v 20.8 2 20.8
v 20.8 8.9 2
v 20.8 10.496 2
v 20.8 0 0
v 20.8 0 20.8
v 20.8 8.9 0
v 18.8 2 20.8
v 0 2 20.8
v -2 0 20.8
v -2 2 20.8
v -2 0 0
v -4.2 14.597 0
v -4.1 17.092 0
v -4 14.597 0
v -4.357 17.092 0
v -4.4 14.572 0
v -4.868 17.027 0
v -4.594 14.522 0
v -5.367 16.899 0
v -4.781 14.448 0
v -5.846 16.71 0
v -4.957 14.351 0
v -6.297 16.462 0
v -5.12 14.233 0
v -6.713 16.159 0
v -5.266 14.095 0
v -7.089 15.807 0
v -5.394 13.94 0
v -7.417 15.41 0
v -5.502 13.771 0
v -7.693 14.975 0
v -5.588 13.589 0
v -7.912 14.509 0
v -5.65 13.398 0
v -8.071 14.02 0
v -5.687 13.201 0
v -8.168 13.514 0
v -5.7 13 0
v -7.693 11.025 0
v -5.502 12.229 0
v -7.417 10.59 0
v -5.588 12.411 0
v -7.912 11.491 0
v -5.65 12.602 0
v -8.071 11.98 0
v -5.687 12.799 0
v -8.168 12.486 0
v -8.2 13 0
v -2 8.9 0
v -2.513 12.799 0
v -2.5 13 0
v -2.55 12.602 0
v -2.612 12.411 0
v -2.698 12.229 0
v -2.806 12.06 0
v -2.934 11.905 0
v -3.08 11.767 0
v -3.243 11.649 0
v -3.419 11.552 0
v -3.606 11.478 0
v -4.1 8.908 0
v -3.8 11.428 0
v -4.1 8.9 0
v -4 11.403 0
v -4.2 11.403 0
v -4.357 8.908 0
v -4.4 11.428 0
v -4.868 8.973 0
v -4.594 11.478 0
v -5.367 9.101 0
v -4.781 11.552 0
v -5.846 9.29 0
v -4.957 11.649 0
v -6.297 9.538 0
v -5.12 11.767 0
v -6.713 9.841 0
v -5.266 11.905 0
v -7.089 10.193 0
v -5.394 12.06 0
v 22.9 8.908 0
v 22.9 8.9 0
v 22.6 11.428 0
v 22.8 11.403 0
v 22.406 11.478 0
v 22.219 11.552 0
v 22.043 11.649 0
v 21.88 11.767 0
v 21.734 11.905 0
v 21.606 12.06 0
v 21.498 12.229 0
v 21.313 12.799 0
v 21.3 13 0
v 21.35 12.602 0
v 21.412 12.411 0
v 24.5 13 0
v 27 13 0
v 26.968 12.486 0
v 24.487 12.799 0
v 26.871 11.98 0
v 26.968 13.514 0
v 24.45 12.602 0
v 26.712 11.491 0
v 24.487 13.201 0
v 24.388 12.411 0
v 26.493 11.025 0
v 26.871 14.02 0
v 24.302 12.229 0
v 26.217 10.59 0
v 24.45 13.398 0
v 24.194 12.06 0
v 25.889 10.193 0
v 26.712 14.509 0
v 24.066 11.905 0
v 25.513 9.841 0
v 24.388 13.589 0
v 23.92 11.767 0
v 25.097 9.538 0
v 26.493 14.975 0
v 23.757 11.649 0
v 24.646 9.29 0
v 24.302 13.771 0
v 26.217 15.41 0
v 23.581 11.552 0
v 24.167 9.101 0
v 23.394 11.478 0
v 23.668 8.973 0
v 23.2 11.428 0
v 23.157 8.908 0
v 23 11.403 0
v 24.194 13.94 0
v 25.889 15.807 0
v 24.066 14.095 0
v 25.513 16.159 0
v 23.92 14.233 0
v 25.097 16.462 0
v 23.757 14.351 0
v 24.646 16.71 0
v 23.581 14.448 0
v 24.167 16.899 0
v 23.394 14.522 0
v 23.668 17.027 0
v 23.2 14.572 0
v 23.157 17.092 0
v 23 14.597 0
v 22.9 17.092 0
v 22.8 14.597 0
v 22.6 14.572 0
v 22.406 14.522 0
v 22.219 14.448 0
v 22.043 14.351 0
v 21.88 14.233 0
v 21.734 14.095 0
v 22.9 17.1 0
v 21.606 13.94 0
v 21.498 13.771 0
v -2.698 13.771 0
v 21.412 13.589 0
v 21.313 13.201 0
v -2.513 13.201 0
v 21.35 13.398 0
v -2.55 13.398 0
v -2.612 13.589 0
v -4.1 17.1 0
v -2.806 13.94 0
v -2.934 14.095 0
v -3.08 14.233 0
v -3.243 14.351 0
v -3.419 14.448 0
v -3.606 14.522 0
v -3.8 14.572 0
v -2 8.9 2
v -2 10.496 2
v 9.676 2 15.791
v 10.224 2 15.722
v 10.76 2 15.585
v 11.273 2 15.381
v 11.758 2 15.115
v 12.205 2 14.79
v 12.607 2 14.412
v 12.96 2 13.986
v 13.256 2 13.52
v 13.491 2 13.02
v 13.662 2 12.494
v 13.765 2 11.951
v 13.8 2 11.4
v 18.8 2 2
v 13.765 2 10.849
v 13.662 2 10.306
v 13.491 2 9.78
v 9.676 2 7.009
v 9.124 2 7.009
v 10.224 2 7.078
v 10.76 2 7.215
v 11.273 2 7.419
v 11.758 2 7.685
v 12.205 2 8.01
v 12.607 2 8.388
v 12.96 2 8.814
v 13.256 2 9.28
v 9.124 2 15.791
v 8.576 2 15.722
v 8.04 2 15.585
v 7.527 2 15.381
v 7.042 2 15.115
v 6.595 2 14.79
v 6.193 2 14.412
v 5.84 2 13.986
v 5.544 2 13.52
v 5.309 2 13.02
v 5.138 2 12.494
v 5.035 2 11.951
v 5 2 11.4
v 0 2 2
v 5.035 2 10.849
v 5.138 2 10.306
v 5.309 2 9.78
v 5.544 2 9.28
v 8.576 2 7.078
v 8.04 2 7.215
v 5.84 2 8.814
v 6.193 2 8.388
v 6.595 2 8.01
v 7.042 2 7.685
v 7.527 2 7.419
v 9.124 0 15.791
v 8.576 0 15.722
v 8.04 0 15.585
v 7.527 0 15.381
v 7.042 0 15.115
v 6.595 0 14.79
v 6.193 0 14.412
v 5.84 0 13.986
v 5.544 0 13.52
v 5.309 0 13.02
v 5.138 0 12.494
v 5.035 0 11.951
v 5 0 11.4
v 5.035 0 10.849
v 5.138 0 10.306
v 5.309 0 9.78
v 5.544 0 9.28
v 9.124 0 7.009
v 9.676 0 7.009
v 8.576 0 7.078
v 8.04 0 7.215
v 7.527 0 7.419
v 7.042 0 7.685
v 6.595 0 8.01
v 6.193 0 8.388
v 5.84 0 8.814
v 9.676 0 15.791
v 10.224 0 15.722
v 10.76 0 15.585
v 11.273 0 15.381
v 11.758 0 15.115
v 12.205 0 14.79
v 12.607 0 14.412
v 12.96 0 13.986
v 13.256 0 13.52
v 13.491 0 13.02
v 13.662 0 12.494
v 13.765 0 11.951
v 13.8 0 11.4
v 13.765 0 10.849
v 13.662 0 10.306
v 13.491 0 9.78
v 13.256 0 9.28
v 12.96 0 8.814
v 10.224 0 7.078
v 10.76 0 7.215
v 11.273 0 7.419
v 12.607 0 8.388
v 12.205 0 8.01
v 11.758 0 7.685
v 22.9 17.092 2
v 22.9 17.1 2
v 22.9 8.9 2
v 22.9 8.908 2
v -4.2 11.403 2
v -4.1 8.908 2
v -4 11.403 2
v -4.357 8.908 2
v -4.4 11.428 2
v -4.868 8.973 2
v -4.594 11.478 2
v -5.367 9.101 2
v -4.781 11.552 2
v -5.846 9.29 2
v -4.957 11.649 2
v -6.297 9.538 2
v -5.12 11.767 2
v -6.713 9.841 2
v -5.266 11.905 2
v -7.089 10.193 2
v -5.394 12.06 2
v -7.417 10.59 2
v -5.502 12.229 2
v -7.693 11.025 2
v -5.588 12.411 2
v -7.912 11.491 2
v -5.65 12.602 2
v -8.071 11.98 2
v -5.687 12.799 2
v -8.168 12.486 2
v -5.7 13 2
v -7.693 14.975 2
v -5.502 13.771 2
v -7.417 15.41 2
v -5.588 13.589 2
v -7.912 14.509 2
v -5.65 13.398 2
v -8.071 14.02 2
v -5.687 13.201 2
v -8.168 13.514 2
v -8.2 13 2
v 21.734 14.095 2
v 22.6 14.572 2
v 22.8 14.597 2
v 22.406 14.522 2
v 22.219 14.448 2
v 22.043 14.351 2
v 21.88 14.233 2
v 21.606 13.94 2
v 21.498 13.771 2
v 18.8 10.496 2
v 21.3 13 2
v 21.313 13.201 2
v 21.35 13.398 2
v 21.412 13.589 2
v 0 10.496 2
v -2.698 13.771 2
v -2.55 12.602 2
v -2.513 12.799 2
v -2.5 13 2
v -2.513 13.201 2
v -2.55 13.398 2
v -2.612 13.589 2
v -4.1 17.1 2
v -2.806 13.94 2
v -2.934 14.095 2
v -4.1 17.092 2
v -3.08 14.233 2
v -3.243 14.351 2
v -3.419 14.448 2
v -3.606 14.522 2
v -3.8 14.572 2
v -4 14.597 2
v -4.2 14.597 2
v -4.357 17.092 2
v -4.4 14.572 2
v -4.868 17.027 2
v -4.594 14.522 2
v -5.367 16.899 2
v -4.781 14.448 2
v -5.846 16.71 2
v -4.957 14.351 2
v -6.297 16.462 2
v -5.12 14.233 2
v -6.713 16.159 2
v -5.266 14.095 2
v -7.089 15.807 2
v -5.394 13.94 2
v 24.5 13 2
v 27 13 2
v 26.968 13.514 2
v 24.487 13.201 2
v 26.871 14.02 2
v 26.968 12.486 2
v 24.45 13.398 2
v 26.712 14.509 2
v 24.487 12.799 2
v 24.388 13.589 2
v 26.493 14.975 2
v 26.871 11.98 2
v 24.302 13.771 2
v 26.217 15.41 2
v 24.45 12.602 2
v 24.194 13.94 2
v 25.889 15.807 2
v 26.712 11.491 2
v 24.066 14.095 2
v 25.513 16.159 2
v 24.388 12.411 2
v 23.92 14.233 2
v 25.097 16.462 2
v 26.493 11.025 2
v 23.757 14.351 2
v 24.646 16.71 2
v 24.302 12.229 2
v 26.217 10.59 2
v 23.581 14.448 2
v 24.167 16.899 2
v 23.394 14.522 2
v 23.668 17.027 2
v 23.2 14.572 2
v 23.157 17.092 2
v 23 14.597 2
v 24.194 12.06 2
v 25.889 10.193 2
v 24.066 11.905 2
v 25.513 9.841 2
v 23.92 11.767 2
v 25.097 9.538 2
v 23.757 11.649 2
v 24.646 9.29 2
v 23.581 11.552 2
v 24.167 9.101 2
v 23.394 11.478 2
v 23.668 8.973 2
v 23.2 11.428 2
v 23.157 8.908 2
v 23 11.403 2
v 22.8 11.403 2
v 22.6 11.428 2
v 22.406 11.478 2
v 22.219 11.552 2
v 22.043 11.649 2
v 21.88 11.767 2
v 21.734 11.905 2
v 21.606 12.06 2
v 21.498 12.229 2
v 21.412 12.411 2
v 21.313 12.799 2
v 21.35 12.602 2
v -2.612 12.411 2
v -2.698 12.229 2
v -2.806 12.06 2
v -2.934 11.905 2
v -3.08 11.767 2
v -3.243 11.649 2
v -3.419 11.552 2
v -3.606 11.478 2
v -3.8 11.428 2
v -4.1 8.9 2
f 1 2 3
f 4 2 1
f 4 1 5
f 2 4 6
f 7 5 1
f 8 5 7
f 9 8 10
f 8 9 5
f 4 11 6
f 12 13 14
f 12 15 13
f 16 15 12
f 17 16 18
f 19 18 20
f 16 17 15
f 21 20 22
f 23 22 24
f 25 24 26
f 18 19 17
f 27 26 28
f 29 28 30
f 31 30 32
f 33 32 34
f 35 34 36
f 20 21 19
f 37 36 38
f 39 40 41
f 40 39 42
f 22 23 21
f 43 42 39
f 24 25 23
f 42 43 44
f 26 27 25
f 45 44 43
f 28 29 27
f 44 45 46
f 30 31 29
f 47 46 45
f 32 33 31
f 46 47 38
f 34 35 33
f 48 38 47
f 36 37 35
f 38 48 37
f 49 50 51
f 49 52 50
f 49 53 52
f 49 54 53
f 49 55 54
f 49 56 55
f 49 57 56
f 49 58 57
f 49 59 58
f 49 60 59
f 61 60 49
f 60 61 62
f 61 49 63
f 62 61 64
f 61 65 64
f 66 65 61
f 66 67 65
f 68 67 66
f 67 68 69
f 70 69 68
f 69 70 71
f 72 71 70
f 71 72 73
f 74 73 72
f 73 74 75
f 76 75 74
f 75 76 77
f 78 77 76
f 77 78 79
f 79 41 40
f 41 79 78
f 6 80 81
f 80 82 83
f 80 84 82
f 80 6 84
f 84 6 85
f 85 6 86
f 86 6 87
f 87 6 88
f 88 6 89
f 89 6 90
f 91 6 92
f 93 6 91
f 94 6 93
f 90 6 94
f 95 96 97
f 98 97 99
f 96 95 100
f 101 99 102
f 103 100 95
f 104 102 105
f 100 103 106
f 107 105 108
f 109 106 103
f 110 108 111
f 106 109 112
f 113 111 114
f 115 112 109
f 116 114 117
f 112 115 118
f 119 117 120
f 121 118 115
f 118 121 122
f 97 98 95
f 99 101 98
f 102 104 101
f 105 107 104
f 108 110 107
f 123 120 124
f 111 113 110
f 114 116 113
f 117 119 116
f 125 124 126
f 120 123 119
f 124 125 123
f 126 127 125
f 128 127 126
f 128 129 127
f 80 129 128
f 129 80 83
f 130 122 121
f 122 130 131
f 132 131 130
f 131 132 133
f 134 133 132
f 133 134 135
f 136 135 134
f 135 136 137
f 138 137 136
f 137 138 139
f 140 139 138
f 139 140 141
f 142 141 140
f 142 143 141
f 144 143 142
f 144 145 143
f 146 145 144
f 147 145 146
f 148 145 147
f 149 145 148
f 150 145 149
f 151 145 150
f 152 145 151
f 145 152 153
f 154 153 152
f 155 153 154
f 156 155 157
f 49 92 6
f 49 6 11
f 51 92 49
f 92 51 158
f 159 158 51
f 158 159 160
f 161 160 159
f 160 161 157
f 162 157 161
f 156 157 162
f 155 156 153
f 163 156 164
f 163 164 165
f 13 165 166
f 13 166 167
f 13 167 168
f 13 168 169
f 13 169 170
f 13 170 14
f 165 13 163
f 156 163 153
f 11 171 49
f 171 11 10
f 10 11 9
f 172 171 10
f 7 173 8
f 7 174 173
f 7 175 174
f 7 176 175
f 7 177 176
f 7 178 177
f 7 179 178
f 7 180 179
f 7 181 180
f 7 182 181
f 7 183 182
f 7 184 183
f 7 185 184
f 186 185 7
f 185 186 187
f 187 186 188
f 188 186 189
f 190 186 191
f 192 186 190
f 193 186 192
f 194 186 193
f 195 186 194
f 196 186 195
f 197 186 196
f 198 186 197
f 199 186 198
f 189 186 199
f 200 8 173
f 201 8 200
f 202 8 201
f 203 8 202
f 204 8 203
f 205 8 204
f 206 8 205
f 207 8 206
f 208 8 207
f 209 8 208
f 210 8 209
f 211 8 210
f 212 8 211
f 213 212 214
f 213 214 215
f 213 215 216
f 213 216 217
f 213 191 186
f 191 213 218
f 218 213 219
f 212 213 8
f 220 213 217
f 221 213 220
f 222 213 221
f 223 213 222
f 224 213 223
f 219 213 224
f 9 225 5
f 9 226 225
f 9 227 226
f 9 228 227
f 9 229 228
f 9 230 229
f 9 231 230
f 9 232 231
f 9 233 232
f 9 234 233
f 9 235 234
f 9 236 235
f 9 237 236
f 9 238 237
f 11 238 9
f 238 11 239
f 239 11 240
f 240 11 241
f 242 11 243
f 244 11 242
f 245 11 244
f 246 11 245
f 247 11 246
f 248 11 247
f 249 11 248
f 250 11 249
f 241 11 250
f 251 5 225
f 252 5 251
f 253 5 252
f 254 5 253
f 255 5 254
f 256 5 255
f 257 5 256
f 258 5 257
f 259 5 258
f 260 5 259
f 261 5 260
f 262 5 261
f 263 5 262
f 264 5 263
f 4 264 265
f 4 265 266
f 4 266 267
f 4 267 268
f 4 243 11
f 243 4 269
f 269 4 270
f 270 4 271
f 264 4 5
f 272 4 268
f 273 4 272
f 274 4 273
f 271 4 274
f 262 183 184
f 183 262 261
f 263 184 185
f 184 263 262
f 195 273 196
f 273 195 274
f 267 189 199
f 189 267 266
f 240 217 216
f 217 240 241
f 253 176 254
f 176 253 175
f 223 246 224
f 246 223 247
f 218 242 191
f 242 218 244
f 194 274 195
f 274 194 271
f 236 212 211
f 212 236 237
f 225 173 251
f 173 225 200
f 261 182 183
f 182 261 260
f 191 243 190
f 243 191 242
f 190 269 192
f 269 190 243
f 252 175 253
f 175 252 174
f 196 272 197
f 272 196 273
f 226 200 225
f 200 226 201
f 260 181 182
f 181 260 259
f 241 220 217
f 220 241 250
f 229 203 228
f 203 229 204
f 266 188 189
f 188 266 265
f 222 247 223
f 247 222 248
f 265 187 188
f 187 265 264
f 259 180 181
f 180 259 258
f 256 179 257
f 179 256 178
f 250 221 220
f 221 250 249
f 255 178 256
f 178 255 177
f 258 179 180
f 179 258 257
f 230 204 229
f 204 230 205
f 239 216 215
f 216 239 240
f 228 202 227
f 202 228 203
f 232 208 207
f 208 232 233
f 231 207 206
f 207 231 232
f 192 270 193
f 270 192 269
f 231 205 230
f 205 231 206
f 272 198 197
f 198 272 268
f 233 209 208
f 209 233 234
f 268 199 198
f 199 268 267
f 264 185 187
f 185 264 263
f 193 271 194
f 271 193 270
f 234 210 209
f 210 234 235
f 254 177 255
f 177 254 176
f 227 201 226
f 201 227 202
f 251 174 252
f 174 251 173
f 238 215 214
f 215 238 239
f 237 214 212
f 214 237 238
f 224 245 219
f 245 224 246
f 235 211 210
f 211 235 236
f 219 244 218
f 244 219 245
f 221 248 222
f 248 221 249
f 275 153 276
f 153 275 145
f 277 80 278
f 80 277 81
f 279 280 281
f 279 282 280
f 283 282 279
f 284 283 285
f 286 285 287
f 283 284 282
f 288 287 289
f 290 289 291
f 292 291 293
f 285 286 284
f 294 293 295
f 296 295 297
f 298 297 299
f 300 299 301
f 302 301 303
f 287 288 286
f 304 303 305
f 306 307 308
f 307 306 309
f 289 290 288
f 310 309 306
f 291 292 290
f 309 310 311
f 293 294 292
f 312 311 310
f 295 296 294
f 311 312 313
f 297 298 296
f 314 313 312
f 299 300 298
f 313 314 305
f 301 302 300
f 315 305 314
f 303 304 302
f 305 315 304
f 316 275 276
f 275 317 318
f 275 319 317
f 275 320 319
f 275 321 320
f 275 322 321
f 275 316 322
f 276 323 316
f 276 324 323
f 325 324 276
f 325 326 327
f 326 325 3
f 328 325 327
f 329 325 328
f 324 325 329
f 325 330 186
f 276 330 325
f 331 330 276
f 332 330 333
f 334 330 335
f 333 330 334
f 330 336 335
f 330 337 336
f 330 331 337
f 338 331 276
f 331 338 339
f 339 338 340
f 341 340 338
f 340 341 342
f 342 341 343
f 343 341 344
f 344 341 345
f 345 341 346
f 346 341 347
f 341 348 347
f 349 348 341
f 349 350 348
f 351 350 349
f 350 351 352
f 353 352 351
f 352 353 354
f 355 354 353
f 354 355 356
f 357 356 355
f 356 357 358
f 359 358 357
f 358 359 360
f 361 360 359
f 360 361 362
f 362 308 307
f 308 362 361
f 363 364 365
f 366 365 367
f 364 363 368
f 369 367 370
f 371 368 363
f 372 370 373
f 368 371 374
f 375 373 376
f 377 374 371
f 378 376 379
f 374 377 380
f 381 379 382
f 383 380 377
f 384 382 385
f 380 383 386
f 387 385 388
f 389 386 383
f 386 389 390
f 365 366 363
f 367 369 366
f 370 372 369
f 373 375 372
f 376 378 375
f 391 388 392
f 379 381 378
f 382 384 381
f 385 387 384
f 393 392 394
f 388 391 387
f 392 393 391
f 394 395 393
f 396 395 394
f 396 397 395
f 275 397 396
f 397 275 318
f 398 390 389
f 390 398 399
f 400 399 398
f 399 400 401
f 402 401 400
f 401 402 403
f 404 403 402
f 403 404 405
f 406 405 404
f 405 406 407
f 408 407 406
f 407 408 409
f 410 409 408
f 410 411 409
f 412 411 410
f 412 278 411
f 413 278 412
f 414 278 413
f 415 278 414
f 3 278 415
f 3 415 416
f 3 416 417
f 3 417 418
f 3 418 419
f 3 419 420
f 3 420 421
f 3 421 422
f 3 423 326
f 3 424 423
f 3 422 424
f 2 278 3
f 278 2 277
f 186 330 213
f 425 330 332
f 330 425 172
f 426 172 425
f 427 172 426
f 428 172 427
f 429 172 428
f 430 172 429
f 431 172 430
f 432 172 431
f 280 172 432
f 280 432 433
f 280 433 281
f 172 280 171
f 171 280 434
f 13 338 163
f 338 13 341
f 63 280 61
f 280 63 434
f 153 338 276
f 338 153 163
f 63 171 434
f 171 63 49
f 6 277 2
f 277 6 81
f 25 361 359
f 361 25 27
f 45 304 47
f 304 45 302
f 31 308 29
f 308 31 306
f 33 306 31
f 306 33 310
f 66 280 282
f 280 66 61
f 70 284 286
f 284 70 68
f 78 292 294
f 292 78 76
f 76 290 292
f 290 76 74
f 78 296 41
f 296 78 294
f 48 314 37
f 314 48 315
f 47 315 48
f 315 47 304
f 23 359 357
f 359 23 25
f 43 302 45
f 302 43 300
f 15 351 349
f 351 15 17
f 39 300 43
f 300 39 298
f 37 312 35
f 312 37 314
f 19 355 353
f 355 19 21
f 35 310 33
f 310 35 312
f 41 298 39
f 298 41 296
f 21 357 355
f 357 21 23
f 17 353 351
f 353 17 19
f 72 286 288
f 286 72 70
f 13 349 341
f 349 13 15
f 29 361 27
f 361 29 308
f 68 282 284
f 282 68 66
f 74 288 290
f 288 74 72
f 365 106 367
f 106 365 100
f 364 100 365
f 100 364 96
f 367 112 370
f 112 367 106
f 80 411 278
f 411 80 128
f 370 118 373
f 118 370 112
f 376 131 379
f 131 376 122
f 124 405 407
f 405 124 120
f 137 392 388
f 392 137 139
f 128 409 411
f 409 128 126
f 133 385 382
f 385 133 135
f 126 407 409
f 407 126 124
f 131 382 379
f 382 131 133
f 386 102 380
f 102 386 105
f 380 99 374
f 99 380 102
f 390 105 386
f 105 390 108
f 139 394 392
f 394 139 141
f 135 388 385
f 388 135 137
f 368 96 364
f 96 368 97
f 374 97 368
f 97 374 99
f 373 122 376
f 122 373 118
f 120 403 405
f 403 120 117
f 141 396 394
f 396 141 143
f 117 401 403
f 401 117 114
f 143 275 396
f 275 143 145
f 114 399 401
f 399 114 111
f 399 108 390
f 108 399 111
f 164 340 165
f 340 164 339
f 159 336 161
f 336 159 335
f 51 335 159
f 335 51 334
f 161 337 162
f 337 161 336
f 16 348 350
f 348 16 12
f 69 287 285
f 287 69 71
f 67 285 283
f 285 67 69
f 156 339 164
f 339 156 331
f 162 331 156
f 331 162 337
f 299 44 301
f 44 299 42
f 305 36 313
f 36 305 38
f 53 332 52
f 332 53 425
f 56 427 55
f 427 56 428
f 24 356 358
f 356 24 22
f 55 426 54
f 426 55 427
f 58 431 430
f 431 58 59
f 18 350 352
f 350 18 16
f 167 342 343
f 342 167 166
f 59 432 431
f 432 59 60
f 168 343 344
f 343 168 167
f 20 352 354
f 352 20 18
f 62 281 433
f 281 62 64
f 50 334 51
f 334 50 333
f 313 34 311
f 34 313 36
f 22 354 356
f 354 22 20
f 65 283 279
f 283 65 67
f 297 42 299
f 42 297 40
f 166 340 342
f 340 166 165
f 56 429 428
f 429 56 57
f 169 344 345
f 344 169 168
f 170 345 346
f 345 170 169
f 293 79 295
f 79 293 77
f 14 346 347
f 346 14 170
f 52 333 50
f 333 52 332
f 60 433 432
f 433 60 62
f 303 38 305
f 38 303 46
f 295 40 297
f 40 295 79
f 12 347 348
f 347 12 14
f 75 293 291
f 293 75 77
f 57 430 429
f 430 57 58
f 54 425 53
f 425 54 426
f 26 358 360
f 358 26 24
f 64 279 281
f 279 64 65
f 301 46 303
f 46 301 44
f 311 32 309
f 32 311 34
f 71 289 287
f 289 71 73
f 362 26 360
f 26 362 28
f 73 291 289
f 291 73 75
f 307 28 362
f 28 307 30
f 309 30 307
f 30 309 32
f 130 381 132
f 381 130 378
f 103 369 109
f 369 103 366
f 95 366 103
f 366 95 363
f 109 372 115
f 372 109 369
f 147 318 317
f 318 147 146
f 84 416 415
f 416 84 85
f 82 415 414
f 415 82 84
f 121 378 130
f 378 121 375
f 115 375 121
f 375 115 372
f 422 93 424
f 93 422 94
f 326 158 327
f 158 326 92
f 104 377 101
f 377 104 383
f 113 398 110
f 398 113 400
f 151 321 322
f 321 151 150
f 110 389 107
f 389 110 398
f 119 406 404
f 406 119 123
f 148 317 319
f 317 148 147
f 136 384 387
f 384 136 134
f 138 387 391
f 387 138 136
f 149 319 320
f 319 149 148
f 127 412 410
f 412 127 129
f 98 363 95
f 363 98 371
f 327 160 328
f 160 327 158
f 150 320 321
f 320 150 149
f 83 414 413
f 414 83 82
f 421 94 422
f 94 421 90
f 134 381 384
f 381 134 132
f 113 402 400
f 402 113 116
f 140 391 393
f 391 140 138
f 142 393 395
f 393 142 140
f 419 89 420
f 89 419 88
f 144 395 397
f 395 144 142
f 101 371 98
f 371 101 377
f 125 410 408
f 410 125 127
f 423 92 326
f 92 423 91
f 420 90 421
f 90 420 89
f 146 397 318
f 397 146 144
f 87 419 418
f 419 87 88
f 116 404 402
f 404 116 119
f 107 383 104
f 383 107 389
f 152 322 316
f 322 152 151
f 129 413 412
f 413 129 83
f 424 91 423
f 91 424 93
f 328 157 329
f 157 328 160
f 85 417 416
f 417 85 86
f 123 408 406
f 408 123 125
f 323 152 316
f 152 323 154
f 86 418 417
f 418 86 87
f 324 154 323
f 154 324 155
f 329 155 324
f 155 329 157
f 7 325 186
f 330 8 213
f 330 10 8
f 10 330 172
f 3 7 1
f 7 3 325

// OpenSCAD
use <MCAD/libtriangles.scad>

$fn = 50;
wall = 2;
side_pad = 5;
back_pad = 4;
power_hole_d = 8.8;
bottom_sz_x = power_hole_d+side_pad*2;
bottom_sz_y = 15;
hole_d = 3.2;
ear_sz_x = hole_d + 5;
ear_sz_y = hole_d + 5;

translate([-wall, 0, 0]) {
  difference() {
    cube([power_hole_d+side_pad*2+wall*2, wall, power_hole_d+side_pad*2+wall]);
    translate([power_hole_d/2+side_pad+wall, bottom_sz_y, power_hole_d/2+side_pad+wall]) {
      rotate([90, 0, 0]) {
        cylinder(d=power_hole_d, h=30);
      }
    }
  }
}
translate([0, 0, 0]) {
  cube([bottom_sz_x, power_hole_d+back_pad*2, wall]);
  translate([-ear_sz_x, bottom_sz_y-wall-ear_sz_y/2, 0]) {
  //  union() {
    difference() {
      translate([ear_sz_x/2, 0, 0]) {
        cube([bottom_sz_x+ear_sz_x, ear_sz_y, wall]);
        translate([0, ear_sz_y/2, 0]) {
          cylinder(d=ear_sz_x, h=wall);
        }
        translate([bottom_sz_x+ear_sz_x, ear_sz_y/2, 0]) {
          cylinder(d=ear_sz_x, h=wall);
        }
      }
      translate([ear_sz_x/2, ear_sz_y/2, -10]) {
        cylinder(d=hole_d, h=20);
        translate([bottom_sz_x+ear_sz_x, 0, 0]) {
          cylinder(d=hole_d, h=20);
        }
      }
    }
  }
}
for(x=[0, bottom_sz_x+wall]) {
  translate([x, wall, 0]) {
    rotate([0, 0, 90]) {
      rightprism(bottom_sz_x/2, wall, power_hole_d+side_pad*2+wall);
    }
  }
}
